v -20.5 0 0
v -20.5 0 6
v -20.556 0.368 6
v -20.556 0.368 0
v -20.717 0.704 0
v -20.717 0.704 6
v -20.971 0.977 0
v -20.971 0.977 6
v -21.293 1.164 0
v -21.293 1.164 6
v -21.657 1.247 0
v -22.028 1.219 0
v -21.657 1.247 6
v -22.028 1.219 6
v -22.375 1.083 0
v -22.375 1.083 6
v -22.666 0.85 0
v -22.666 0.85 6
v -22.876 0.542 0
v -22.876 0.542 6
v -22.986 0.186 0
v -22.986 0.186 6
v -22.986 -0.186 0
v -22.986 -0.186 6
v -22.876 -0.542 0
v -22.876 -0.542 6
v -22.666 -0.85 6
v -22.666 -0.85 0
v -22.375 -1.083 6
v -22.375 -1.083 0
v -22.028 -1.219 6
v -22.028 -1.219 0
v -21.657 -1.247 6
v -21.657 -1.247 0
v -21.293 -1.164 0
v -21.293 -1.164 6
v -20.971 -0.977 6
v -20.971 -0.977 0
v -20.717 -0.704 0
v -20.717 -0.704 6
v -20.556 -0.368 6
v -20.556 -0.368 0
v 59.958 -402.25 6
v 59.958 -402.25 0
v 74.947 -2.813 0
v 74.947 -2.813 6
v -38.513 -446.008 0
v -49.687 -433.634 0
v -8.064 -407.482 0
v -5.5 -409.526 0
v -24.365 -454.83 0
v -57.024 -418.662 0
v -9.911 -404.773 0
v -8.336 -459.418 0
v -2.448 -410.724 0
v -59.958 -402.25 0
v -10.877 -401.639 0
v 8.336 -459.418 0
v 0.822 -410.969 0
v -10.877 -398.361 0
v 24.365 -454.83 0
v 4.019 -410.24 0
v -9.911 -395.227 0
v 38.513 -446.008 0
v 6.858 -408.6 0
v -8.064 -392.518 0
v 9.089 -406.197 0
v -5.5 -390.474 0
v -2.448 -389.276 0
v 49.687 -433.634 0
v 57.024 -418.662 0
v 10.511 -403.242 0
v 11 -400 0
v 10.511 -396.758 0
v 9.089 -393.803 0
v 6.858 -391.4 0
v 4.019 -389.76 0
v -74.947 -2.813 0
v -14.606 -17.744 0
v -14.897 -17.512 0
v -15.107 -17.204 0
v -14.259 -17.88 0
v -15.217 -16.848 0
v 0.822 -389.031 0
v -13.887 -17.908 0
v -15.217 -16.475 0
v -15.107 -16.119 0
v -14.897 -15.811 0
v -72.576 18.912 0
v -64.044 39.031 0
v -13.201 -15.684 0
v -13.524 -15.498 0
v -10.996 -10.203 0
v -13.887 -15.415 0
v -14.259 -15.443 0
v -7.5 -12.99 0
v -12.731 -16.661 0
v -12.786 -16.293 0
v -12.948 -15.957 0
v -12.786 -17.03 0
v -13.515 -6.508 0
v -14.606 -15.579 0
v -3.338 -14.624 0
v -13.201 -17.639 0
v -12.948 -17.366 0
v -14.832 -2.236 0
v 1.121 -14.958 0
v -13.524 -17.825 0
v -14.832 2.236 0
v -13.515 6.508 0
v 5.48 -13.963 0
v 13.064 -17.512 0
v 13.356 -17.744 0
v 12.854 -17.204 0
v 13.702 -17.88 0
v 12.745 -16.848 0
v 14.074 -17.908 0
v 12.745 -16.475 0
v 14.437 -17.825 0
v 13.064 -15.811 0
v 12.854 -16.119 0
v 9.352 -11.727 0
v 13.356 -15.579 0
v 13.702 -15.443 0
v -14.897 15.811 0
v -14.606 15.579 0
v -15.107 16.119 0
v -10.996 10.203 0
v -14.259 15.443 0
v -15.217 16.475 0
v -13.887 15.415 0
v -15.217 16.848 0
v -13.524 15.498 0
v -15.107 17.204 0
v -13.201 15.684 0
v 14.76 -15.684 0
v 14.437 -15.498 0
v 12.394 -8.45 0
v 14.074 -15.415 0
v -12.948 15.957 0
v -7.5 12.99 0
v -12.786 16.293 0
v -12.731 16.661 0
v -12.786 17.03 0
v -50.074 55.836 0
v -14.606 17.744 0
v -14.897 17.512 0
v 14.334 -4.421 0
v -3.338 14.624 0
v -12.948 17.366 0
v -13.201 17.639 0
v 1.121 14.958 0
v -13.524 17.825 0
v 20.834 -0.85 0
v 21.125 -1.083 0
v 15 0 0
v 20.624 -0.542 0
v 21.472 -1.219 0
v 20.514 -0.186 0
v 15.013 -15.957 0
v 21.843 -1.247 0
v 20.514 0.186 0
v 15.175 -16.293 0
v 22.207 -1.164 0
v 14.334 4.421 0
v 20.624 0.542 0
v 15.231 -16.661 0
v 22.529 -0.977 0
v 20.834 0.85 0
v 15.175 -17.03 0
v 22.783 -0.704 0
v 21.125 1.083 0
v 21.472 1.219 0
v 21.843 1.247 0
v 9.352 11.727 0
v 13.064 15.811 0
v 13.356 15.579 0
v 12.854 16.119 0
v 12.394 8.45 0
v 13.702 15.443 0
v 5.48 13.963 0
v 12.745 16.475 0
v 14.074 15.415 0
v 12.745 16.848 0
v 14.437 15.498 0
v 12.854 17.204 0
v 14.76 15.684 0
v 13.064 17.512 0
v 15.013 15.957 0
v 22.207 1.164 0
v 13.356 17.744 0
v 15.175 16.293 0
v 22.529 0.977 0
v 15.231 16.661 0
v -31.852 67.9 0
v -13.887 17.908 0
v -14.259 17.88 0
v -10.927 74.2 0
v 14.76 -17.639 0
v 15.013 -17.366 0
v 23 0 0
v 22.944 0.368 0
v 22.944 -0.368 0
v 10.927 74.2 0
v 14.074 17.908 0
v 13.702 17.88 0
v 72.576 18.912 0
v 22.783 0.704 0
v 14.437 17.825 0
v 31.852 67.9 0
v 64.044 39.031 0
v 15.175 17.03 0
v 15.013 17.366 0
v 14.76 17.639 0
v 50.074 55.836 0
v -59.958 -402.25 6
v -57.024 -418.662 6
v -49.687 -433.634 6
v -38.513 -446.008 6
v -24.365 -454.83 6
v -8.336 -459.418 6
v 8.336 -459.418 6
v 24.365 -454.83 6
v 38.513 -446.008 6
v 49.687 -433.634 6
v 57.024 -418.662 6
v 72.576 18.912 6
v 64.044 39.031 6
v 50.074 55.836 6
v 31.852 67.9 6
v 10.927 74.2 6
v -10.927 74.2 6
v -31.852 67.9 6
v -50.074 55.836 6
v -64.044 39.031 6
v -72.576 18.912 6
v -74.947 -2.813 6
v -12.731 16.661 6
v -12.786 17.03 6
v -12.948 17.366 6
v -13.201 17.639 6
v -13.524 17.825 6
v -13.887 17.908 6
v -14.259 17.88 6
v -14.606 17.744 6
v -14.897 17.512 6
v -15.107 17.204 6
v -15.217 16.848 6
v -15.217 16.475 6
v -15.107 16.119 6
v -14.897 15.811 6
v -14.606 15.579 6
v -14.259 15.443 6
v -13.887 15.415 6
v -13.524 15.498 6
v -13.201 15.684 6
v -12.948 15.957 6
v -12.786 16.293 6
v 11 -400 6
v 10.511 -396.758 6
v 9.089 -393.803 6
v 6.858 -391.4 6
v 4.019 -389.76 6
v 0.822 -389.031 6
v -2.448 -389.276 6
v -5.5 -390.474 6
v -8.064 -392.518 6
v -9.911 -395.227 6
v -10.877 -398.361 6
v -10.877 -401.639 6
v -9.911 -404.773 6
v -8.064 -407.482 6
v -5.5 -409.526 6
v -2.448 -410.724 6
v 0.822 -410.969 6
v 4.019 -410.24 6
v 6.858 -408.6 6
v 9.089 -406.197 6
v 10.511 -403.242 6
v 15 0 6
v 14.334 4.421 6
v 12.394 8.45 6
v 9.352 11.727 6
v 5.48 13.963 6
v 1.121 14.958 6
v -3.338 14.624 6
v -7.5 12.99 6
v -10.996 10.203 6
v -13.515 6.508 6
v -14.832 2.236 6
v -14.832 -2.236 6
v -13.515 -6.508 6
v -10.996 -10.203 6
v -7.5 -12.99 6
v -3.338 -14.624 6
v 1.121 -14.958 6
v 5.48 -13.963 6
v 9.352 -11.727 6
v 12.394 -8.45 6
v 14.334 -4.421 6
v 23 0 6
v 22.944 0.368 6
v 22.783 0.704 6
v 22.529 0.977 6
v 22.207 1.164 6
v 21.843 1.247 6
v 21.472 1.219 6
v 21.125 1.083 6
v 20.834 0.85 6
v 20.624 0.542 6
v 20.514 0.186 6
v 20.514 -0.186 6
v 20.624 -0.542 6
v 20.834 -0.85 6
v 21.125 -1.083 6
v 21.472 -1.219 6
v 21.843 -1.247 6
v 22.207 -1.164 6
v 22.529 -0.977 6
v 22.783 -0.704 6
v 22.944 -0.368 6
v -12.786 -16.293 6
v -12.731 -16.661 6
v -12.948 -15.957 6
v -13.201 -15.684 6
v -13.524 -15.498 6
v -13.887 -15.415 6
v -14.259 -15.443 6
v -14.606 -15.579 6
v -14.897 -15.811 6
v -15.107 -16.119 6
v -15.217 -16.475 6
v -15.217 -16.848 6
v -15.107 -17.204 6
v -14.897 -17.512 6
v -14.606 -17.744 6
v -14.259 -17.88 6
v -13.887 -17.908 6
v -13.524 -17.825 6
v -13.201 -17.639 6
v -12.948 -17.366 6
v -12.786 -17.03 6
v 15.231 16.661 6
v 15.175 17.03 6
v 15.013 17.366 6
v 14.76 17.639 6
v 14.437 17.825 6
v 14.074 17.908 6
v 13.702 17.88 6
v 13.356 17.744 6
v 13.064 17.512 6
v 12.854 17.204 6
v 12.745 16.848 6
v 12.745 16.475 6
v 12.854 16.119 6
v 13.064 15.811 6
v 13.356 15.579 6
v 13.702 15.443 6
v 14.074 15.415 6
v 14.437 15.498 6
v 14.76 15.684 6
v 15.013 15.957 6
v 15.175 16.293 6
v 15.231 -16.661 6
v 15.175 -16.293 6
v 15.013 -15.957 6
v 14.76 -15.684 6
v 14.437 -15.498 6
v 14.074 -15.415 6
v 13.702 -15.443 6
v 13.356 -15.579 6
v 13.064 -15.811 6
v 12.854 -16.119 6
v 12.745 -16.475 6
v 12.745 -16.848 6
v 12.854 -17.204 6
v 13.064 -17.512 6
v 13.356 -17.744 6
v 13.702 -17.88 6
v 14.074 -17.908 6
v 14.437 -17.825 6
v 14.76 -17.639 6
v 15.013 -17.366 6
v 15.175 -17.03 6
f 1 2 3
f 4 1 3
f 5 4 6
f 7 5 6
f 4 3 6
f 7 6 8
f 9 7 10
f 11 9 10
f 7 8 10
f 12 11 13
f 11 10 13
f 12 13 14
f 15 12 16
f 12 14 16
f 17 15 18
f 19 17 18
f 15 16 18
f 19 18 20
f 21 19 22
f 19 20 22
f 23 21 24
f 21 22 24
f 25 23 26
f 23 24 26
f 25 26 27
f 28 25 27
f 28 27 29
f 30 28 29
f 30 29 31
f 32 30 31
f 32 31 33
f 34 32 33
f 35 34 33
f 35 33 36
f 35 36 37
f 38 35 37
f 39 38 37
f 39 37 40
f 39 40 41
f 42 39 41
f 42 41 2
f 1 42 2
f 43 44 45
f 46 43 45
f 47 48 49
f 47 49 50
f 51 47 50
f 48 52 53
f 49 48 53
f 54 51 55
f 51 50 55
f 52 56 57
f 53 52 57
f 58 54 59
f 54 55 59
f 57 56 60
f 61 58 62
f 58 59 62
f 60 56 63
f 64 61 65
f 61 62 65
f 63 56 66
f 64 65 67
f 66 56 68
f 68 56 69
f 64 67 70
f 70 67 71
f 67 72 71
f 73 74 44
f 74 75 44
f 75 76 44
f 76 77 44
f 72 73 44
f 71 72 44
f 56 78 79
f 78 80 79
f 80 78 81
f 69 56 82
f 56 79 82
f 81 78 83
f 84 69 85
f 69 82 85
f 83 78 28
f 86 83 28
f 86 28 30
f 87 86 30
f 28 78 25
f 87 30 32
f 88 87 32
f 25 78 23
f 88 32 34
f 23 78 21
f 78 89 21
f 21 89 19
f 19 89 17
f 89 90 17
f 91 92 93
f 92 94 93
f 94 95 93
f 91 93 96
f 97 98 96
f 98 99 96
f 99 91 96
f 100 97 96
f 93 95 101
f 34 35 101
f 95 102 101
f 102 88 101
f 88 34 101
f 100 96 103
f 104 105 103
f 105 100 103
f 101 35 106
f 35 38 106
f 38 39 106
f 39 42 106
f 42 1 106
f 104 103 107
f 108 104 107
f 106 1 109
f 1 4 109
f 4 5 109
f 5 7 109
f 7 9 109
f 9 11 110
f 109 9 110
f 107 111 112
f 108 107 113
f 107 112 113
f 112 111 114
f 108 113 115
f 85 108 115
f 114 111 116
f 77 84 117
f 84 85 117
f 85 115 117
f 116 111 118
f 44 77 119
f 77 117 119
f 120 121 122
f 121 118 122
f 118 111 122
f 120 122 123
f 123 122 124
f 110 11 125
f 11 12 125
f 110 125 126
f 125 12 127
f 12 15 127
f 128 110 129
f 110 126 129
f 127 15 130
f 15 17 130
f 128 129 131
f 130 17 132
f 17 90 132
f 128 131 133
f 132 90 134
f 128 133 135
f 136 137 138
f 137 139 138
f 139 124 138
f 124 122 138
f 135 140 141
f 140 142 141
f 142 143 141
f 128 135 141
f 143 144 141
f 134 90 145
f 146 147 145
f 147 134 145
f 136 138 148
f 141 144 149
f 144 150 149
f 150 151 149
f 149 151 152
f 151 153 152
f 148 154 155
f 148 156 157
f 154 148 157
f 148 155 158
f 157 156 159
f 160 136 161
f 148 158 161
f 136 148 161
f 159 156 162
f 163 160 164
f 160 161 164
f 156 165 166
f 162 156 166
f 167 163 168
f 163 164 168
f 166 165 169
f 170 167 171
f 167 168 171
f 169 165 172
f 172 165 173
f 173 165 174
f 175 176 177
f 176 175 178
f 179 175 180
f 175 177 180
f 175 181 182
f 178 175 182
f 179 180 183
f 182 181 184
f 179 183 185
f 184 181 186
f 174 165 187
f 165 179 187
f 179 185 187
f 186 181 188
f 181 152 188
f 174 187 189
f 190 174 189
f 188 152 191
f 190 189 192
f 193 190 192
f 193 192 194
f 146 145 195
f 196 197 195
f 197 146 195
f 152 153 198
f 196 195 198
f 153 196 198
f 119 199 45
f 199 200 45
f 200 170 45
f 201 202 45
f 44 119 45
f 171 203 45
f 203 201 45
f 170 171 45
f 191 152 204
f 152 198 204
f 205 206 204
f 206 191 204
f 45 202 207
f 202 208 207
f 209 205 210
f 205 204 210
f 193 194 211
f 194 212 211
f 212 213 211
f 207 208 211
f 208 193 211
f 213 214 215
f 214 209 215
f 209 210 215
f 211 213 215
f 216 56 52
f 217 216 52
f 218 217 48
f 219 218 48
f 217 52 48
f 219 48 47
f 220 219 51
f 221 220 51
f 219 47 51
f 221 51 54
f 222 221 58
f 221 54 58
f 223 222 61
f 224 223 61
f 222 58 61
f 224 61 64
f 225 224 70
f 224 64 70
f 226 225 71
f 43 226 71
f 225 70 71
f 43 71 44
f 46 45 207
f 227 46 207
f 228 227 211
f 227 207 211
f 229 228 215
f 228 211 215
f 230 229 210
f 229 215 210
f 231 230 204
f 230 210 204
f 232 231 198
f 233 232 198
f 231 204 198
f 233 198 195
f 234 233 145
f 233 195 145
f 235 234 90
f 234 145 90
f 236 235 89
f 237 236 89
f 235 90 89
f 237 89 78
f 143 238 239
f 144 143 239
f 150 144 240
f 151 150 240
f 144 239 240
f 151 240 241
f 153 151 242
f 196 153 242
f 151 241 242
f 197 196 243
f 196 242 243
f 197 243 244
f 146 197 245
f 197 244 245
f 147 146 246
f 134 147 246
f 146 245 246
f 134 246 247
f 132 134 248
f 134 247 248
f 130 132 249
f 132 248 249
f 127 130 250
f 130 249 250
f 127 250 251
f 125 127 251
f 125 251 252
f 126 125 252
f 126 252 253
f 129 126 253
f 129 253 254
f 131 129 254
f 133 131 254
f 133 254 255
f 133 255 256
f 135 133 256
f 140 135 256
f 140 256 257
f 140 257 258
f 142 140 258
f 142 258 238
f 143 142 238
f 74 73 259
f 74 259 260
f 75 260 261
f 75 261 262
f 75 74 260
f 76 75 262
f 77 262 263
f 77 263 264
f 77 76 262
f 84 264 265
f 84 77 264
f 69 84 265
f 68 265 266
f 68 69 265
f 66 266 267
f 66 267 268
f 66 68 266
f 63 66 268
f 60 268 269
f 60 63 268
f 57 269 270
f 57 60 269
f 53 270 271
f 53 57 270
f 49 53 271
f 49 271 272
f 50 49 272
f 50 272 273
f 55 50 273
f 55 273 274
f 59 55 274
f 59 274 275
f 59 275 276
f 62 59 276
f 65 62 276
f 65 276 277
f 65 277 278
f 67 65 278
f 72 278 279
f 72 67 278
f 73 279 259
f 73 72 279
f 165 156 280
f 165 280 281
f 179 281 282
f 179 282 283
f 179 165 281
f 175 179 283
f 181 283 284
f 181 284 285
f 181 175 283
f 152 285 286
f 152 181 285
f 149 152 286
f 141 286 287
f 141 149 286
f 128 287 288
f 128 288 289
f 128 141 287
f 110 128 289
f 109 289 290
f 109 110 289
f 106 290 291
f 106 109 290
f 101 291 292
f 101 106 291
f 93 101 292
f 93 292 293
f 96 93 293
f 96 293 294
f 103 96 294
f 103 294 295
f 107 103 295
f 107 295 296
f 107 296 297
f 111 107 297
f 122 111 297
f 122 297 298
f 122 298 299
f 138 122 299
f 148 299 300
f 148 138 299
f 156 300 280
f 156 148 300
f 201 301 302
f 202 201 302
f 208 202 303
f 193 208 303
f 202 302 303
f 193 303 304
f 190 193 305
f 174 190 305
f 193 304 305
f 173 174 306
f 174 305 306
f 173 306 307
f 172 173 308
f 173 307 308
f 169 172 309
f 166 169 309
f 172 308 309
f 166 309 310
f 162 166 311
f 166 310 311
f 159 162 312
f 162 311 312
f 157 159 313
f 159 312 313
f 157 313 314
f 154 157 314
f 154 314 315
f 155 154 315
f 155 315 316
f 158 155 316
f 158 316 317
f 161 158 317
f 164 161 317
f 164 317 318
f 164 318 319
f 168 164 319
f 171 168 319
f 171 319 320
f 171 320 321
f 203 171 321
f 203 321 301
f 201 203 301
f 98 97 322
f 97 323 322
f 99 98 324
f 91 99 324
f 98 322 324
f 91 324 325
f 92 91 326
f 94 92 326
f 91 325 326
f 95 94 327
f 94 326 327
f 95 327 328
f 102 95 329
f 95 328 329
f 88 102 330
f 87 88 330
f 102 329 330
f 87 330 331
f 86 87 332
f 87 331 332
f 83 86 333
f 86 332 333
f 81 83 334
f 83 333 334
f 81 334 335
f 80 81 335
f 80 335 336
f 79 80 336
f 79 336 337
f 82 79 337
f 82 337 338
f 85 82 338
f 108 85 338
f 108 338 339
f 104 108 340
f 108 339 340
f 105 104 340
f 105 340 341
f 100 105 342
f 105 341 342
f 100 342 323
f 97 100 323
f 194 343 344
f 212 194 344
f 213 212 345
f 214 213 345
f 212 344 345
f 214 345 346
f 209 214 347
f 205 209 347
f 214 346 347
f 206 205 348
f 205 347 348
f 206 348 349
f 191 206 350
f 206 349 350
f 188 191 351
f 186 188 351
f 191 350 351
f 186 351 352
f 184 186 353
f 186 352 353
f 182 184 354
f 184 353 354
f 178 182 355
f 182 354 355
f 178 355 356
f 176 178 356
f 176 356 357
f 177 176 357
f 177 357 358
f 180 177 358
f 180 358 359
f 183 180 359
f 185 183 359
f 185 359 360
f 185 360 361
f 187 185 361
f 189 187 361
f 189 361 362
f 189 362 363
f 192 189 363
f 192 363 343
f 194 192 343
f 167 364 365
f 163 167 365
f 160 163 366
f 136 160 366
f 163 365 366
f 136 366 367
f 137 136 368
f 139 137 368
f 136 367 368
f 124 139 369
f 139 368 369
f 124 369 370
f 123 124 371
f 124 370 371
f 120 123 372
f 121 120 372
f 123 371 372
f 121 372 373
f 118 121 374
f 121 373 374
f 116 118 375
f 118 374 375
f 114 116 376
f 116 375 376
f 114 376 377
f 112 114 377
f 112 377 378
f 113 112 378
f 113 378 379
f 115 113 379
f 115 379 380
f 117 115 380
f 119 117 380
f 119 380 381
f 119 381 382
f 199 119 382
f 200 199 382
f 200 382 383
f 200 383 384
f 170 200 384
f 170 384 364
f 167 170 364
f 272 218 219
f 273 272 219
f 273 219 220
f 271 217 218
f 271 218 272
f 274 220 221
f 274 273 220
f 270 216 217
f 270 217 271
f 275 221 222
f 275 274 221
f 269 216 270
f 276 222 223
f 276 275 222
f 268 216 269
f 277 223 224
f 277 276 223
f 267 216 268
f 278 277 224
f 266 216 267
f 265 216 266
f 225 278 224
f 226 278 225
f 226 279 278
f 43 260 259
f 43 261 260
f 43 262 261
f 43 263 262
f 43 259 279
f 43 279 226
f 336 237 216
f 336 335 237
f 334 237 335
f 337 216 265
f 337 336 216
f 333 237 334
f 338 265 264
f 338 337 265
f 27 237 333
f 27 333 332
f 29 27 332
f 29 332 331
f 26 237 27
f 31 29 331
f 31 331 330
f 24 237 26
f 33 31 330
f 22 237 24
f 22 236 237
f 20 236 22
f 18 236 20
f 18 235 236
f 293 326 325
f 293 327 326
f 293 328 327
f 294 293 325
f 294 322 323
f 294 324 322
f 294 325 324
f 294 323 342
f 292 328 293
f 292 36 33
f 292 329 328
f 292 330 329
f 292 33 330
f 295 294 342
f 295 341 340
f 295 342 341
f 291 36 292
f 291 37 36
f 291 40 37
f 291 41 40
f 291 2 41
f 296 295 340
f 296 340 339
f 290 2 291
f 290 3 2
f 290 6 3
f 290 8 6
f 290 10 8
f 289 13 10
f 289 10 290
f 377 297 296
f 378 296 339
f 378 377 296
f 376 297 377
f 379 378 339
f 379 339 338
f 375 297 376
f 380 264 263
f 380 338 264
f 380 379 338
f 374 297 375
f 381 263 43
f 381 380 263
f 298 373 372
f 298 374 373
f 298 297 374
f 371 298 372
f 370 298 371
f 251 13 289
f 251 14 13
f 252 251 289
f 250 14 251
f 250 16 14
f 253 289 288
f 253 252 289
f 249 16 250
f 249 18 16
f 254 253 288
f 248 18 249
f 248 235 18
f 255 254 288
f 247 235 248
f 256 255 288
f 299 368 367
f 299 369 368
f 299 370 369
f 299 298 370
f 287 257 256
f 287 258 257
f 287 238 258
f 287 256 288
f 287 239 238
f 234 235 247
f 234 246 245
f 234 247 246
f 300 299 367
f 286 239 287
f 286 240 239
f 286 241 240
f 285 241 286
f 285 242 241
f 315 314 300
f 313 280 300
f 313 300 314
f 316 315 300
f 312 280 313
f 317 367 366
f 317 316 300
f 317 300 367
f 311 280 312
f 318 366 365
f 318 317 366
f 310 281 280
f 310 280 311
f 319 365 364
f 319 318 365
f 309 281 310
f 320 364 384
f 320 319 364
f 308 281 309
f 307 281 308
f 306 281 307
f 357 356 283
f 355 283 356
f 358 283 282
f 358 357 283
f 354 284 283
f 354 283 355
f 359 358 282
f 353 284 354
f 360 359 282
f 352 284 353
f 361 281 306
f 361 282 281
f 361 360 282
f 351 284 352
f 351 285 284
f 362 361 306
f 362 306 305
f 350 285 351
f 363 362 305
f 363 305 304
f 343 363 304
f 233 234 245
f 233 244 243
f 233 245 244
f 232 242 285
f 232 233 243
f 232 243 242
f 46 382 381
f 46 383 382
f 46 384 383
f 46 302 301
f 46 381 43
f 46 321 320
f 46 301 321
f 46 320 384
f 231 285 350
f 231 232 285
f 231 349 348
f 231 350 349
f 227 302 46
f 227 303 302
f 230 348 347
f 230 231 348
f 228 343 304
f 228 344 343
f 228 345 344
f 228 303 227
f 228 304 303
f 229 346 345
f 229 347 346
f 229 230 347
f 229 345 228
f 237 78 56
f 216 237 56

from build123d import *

# Parameters (mm, degrees)
SKETCH_1_R          = 15
SKETCH_1_R_2        = 11
EXTRUDE_1_DEPTH     = 6
SKETCH_2_R          = 1.25
CUT_EXTRUDE_1_DEPTH = 10


with BuildPart() as part:
    # 草图1 → 凸台-拉伸1 (new body)
    with BuildSketch(Plane.XY):
        with BuildLine():
            Line((-74.947247073, -2.8125), (-59.957797658, -402.25))
            ThreePointArc((-59.957797658, -402.25), (0, -460), (59.957797658, -402.25))
            Line((59.957797658, -402.25), (74.947247073, -2.8125))
            ThreePointArc((74.947247073, -2.8125), (0, 75), (-74.947247073, -2.8125))
        make_face()
        Circle(SKETCH_1_R, mode=Mode.SUBTRACT)
        with Locations((0, -400)):
            Circle(SKETCH_1_R_2, mode=Mode.SUBTRACT)
    extrude(amount=EXTRUDE_1_DEPTH)

    # 草图2 → 切除-拉伸1 (cut, symmetric)
    with BuildSketch(Plane.XY.offset(6)):
        with Locations((13.980630511, 16.661466638)):
            Circle(SKETCH_2_R)
        with Locations((21.75, 0)):
            Circle(SKETCH_2_R)
        with Locations((13.980630511, -16.661466638)):
            Circle(SKETCH_2_R)
        with Locations((-13.980630511, 16.661466638)):
            Circle(SKETCH_2_R)
        with Locations((-21.75, 0)):
            Circle(SKETCH_2_R)
        with Locations((-13.980630511, -16.661466638)):
            Circle(SKETCH_2_R)
    extrude(amount=CUT_EXTRUDE_1_DEPTH, both=True, mode=Mode.SUBTRACT)


solid = part.part
